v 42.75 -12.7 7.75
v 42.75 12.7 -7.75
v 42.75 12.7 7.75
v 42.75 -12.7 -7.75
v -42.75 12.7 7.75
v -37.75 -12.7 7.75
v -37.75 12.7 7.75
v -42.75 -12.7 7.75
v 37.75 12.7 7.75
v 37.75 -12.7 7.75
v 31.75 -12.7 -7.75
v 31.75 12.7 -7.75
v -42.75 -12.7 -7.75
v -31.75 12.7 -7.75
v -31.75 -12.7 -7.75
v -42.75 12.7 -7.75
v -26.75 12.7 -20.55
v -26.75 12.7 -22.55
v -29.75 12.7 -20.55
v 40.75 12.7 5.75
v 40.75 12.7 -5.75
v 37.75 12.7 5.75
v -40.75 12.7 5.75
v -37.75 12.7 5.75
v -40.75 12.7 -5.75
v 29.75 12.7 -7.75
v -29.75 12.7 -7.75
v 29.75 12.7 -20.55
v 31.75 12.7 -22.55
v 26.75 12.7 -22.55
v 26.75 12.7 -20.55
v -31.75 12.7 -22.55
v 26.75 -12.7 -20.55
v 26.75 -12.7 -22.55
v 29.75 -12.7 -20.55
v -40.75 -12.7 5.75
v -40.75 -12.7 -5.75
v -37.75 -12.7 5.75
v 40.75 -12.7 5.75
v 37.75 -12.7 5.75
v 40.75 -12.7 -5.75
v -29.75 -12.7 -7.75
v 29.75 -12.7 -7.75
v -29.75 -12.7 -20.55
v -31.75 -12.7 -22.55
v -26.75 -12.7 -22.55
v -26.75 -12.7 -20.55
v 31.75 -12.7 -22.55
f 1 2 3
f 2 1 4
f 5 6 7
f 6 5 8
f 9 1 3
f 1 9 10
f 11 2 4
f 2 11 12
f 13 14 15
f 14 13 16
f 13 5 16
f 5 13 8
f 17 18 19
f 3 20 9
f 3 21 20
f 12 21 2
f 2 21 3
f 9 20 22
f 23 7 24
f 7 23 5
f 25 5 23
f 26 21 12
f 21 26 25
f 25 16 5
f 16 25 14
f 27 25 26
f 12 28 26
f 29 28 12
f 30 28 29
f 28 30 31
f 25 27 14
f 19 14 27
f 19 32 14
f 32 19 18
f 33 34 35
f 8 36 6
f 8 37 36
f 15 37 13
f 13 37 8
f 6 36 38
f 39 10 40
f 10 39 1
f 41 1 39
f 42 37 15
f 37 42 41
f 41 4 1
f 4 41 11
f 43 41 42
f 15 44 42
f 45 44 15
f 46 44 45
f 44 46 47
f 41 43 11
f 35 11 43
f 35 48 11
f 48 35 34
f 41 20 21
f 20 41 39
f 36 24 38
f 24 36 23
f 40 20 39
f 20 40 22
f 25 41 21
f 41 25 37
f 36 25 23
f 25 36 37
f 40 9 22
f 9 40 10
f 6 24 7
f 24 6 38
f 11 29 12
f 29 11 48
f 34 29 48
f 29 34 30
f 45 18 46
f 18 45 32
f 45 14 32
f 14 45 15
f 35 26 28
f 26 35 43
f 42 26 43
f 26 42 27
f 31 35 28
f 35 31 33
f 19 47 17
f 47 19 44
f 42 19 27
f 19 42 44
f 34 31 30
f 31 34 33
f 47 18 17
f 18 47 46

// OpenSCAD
//Parametric Phone DAC Bracket

//by replayreb
//GPL License

//https://www.thingiverse.com/thing:3131593

//(25.4 mm = 1 inch)
overall_length = 25.4;
wall_thickness = 2;

phone_width = 81.5;
phone_thickness = 11.5;
phone_bezel_width = 3;

dac_width= 59.5;
dac_thickness = 12.8;
dac_bezel_width = 3;


//Make Phone bracket
difference(){
    cube([phone_width+wall_thickness*2,overall_length,phone_thickness+wall_thickness*2], center = true);
    
    cube([phone_width,overall_length,phone_thickness], center = true);

    translate([0, 0, wall_thickness/2])
    cube([phone_width-phone_bezel_width*2,overall_length,phone_thickness+wall_thickness], center = true);
}

//Make DAC bracket
translate([0, 0, -(phone_thickness/2+dac_thickness/2)-wall_thickness]){
    difference(){
        cube([dac_width+wall_thickness*2,overall_length,dac_thickness+wall_thickness*2], center = true);

        cube([dac_width,overall_length,dac_thickness], center = true);

    translate([0, 0, -wall_thickness/2])
    cube([dac_width-dac_bezel_width*2,overall_length,dac_thickness+wall_thickness], center = true);
    }
}    
